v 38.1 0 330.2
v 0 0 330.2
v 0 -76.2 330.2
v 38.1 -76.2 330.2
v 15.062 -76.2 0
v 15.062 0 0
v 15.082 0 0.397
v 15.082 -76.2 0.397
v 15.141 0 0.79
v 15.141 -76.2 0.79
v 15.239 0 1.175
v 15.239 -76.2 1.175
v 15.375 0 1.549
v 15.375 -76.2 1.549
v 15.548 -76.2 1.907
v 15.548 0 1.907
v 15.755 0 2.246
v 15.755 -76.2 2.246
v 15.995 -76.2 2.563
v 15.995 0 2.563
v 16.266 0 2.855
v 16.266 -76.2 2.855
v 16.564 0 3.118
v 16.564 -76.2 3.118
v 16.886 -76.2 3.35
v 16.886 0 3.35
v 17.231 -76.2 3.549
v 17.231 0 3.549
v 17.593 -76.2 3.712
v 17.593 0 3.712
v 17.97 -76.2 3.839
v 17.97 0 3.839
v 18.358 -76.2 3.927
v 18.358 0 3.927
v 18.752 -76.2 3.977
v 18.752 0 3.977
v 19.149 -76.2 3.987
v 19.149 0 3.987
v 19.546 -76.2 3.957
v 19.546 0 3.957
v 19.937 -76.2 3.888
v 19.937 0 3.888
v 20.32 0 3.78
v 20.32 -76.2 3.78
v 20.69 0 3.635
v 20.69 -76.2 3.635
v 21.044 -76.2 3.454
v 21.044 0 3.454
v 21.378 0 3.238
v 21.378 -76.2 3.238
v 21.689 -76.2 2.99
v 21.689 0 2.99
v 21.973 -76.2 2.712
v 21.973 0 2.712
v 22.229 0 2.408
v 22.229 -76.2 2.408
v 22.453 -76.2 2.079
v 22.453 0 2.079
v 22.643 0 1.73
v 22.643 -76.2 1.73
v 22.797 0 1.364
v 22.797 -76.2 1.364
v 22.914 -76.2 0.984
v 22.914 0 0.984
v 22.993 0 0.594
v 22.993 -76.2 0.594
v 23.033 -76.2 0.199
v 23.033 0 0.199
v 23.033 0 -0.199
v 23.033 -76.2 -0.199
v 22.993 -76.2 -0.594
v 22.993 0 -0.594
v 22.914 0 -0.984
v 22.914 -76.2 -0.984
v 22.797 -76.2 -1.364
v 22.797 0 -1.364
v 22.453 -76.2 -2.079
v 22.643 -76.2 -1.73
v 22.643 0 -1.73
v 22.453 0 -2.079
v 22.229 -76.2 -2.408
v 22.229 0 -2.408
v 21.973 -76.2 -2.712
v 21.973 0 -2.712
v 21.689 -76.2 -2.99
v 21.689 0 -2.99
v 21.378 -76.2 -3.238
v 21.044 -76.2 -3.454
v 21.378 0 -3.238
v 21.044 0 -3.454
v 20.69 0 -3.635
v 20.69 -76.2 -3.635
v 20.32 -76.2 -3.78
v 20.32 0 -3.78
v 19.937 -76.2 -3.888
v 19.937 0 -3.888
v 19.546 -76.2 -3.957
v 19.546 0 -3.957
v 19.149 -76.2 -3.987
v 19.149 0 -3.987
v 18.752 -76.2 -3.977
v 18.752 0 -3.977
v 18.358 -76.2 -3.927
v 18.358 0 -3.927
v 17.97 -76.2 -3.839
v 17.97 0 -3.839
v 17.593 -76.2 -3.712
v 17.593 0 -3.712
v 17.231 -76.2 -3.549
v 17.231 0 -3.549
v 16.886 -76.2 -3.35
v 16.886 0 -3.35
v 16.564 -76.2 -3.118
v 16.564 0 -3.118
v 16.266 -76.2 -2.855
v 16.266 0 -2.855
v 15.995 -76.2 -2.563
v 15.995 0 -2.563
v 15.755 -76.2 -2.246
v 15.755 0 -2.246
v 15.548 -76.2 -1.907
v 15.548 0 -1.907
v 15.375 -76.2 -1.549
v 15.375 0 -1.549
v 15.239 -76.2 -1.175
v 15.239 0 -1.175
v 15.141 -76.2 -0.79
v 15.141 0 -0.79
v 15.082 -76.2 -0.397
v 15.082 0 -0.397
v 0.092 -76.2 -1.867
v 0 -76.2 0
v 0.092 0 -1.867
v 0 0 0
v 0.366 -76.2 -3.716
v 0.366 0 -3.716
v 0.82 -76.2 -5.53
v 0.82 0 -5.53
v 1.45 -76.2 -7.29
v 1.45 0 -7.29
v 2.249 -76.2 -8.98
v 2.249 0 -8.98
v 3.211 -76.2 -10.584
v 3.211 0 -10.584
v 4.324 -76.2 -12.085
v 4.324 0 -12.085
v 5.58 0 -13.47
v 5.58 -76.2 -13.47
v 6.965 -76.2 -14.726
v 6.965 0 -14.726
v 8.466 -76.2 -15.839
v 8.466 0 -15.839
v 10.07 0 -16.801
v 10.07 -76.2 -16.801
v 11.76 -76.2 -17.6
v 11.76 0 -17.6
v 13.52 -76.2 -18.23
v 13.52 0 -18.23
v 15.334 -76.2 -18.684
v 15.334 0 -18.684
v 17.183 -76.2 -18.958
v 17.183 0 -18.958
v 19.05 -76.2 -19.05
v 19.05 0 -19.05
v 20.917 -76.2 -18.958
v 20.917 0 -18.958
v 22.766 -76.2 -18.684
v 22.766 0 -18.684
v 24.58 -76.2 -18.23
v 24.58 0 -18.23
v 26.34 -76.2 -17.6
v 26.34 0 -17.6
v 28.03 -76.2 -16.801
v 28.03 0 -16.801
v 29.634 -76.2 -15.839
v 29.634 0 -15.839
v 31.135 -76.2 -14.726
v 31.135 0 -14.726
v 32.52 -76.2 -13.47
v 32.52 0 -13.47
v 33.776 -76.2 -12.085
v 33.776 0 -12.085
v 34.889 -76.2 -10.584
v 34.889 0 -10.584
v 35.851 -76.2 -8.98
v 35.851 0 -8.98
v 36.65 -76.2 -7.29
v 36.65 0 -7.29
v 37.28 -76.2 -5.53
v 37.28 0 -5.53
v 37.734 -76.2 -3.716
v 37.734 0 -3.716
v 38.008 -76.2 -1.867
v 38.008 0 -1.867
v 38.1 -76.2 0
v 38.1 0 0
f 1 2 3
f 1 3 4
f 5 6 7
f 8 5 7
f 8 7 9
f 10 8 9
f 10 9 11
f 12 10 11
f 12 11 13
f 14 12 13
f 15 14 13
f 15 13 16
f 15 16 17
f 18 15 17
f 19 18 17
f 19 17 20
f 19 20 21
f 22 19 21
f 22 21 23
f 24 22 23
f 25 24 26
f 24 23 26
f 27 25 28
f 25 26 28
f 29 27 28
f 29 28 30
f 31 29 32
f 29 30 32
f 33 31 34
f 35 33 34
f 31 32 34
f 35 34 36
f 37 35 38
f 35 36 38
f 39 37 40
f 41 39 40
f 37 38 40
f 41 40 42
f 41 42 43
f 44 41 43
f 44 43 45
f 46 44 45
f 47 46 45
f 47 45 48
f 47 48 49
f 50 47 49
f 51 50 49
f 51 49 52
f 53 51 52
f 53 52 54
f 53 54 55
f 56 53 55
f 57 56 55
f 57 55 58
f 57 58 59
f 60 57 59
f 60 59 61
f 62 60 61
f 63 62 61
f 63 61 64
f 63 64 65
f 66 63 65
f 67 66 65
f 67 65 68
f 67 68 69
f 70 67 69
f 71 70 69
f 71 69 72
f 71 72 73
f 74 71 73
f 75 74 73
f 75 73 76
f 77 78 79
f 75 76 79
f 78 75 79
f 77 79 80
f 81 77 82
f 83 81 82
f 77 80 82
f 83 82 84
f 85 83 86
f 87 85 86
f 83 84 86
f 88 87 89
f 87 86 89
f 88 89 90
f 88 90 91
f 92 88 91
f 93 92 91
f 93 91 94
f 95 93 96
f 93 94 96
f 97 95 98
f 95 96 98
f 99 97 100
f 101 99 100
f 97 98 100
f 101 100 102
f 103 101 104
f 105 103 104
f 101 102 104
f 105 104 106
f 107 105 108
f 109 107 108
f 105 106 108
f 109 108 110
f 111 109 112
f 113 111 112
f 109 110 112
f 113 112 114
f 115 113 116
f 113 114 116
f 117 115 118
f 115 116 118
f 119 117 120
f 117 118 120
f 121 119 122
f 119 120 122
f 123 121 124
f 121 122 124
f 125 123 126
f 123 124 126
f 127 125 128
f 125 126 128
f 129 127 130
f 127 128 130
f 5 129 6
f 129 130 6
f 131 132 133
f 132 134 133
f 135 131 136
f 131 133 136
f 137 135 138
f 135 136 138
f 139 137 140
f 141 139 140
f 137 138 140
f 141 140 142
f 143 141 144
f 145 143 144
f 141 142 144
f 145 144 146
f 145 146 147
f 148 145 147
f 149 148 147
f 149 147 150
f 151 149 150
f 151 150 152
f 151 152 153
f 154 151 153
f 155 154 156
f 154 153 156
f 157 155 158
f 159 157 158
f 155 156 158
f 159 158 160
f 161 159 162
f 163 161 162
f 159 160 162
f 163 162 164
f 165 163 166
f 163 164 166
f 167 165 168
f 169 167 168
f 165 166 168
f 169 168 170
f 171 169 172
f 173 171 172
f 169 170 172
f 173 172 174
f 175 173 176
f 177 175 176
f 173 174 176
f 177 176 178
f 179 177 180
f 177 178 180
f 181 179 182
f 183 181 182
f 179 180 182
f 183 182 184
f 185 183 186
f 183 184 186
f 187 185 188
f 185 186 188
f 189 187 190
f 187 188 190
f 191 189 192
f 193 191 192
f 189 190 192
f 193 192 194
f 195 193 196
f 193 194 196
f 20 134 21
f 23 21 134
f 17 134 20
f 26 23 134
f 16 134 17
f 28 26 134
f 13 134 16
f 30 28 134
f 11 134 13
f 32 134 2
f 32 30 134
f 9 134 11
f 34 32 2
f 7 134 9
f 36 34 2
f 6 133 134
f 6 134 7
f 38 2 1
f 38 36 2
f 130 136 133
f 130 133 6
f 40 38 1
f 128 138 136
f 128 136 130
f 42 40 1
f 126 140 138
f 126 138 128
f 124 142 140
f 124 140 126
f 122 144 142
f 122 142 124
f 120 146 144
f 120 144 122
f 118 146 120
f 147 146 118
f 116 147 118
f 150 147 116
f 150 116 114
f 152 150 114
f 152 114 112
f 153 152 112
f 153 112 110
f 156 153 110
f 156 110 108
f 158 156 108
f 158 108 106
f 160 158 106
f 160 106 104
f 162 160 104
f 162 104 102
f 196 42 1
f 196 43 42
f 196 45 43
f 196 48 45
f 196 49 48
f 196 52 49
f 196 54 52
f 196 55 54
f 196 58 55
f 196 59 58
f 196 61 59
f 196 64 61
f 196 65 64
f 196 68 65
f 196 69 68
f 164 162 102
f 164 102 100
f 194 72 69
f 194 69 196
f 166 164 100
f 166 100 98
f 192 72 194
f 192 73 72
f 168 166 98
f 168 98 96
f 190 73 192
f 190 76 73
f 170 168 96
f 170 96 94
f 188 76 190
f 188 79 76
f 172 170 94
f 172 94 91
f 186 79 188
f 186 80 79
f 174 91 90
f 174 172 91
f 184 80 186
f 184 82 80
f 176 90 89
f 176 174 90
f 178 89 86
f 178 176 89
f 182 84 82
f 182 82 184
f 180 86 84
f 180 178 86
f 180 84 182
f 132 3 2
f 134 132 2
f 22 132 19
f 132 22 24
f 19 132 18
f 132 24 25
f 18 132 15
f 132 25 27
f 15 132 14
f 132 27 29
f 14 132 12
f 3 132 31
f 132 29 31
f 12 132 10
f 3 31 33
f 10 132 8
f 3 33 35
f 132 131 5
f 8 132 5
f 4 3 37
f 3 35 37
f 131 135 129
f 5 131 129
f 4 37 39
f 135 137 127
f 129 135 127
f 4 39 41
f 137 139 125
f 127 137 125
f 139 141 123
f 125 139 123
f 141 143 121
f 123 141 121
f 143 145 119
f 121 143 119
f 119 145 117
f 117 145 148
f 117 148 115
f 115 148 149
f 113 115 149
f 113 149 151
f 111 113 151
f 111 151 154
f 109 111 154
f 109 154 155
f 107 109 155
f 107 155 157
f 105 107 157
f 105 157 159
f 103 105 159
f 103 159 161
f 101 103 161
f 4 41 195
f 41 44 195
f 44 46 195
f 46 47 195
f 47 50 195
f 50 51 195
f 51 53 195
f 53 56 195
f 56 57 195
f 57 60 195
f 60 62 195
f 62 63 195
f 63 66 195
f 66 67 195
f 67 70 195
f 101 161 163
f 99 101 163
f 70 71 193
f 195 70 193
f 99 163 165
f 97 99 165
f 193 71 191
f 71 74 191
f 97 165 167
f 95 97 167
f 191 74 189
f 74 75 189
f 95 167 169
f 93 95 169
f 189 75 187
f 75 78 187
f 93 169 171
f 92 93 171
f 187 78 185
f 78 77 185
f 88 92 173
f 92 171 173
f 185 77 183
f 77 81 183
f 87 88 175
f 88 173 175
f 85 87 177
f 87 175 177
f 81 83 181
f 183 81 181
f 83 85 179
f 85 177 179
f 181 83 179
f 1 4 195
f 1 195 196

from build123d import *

# Parameters (mm, degrees)
SKETCH1_W           = 19.05
SKETCH1_H           = 76.2
REVOLVE1_ANGLE      = 180
SKETCH2_W           = 38.1
SKETCH2_H           = 76.2
BOSS_EXTRUDE1_DEPTH = 330.2
SKETCH3_R           = 3.9878
CUT_EXTRUDE1_DEPTH  = 342.013328185


with BuildPart() as part:
    # Sketch1 → Revolve1 (revolve)
    with BuildSketch(Plane.XY):
        with Locations((9.525, -38.1)):
            Rectangle(SKETCH1_W, SKETCH1_H)
    revolve(axis=Axis((19.05, 0, 0), (0, -1, 0)), revolution_arc=REVOLVE1_ANGLE)

    # Sketch2 → Boss-Extrude1 (add)
    with BuildSketch(Plane.XY):
        with Locations((19.05, -38.1)):
            Rectangle(SKETCH2_W, SKETCH2_H)
    extrude(amount=BOSS_EXTRUDE1_DEPTH)

    # Sketch3 → Cut-Extrude1 (cut, through all)
    with BuildSketch(Plane(origin=(0, 0, 0), x_dir=(1, 0, 0), z_dir=(0, 1, 0))):
        with Locations(Location((19.05, 0, 0), (0, 0, 180))):
            Circle(SKETCH3_R)
    extrude(amount=-CUT_EXTRUDE1_DEPTH, mode=Mode.SUBTRACT)


solid = part.part
